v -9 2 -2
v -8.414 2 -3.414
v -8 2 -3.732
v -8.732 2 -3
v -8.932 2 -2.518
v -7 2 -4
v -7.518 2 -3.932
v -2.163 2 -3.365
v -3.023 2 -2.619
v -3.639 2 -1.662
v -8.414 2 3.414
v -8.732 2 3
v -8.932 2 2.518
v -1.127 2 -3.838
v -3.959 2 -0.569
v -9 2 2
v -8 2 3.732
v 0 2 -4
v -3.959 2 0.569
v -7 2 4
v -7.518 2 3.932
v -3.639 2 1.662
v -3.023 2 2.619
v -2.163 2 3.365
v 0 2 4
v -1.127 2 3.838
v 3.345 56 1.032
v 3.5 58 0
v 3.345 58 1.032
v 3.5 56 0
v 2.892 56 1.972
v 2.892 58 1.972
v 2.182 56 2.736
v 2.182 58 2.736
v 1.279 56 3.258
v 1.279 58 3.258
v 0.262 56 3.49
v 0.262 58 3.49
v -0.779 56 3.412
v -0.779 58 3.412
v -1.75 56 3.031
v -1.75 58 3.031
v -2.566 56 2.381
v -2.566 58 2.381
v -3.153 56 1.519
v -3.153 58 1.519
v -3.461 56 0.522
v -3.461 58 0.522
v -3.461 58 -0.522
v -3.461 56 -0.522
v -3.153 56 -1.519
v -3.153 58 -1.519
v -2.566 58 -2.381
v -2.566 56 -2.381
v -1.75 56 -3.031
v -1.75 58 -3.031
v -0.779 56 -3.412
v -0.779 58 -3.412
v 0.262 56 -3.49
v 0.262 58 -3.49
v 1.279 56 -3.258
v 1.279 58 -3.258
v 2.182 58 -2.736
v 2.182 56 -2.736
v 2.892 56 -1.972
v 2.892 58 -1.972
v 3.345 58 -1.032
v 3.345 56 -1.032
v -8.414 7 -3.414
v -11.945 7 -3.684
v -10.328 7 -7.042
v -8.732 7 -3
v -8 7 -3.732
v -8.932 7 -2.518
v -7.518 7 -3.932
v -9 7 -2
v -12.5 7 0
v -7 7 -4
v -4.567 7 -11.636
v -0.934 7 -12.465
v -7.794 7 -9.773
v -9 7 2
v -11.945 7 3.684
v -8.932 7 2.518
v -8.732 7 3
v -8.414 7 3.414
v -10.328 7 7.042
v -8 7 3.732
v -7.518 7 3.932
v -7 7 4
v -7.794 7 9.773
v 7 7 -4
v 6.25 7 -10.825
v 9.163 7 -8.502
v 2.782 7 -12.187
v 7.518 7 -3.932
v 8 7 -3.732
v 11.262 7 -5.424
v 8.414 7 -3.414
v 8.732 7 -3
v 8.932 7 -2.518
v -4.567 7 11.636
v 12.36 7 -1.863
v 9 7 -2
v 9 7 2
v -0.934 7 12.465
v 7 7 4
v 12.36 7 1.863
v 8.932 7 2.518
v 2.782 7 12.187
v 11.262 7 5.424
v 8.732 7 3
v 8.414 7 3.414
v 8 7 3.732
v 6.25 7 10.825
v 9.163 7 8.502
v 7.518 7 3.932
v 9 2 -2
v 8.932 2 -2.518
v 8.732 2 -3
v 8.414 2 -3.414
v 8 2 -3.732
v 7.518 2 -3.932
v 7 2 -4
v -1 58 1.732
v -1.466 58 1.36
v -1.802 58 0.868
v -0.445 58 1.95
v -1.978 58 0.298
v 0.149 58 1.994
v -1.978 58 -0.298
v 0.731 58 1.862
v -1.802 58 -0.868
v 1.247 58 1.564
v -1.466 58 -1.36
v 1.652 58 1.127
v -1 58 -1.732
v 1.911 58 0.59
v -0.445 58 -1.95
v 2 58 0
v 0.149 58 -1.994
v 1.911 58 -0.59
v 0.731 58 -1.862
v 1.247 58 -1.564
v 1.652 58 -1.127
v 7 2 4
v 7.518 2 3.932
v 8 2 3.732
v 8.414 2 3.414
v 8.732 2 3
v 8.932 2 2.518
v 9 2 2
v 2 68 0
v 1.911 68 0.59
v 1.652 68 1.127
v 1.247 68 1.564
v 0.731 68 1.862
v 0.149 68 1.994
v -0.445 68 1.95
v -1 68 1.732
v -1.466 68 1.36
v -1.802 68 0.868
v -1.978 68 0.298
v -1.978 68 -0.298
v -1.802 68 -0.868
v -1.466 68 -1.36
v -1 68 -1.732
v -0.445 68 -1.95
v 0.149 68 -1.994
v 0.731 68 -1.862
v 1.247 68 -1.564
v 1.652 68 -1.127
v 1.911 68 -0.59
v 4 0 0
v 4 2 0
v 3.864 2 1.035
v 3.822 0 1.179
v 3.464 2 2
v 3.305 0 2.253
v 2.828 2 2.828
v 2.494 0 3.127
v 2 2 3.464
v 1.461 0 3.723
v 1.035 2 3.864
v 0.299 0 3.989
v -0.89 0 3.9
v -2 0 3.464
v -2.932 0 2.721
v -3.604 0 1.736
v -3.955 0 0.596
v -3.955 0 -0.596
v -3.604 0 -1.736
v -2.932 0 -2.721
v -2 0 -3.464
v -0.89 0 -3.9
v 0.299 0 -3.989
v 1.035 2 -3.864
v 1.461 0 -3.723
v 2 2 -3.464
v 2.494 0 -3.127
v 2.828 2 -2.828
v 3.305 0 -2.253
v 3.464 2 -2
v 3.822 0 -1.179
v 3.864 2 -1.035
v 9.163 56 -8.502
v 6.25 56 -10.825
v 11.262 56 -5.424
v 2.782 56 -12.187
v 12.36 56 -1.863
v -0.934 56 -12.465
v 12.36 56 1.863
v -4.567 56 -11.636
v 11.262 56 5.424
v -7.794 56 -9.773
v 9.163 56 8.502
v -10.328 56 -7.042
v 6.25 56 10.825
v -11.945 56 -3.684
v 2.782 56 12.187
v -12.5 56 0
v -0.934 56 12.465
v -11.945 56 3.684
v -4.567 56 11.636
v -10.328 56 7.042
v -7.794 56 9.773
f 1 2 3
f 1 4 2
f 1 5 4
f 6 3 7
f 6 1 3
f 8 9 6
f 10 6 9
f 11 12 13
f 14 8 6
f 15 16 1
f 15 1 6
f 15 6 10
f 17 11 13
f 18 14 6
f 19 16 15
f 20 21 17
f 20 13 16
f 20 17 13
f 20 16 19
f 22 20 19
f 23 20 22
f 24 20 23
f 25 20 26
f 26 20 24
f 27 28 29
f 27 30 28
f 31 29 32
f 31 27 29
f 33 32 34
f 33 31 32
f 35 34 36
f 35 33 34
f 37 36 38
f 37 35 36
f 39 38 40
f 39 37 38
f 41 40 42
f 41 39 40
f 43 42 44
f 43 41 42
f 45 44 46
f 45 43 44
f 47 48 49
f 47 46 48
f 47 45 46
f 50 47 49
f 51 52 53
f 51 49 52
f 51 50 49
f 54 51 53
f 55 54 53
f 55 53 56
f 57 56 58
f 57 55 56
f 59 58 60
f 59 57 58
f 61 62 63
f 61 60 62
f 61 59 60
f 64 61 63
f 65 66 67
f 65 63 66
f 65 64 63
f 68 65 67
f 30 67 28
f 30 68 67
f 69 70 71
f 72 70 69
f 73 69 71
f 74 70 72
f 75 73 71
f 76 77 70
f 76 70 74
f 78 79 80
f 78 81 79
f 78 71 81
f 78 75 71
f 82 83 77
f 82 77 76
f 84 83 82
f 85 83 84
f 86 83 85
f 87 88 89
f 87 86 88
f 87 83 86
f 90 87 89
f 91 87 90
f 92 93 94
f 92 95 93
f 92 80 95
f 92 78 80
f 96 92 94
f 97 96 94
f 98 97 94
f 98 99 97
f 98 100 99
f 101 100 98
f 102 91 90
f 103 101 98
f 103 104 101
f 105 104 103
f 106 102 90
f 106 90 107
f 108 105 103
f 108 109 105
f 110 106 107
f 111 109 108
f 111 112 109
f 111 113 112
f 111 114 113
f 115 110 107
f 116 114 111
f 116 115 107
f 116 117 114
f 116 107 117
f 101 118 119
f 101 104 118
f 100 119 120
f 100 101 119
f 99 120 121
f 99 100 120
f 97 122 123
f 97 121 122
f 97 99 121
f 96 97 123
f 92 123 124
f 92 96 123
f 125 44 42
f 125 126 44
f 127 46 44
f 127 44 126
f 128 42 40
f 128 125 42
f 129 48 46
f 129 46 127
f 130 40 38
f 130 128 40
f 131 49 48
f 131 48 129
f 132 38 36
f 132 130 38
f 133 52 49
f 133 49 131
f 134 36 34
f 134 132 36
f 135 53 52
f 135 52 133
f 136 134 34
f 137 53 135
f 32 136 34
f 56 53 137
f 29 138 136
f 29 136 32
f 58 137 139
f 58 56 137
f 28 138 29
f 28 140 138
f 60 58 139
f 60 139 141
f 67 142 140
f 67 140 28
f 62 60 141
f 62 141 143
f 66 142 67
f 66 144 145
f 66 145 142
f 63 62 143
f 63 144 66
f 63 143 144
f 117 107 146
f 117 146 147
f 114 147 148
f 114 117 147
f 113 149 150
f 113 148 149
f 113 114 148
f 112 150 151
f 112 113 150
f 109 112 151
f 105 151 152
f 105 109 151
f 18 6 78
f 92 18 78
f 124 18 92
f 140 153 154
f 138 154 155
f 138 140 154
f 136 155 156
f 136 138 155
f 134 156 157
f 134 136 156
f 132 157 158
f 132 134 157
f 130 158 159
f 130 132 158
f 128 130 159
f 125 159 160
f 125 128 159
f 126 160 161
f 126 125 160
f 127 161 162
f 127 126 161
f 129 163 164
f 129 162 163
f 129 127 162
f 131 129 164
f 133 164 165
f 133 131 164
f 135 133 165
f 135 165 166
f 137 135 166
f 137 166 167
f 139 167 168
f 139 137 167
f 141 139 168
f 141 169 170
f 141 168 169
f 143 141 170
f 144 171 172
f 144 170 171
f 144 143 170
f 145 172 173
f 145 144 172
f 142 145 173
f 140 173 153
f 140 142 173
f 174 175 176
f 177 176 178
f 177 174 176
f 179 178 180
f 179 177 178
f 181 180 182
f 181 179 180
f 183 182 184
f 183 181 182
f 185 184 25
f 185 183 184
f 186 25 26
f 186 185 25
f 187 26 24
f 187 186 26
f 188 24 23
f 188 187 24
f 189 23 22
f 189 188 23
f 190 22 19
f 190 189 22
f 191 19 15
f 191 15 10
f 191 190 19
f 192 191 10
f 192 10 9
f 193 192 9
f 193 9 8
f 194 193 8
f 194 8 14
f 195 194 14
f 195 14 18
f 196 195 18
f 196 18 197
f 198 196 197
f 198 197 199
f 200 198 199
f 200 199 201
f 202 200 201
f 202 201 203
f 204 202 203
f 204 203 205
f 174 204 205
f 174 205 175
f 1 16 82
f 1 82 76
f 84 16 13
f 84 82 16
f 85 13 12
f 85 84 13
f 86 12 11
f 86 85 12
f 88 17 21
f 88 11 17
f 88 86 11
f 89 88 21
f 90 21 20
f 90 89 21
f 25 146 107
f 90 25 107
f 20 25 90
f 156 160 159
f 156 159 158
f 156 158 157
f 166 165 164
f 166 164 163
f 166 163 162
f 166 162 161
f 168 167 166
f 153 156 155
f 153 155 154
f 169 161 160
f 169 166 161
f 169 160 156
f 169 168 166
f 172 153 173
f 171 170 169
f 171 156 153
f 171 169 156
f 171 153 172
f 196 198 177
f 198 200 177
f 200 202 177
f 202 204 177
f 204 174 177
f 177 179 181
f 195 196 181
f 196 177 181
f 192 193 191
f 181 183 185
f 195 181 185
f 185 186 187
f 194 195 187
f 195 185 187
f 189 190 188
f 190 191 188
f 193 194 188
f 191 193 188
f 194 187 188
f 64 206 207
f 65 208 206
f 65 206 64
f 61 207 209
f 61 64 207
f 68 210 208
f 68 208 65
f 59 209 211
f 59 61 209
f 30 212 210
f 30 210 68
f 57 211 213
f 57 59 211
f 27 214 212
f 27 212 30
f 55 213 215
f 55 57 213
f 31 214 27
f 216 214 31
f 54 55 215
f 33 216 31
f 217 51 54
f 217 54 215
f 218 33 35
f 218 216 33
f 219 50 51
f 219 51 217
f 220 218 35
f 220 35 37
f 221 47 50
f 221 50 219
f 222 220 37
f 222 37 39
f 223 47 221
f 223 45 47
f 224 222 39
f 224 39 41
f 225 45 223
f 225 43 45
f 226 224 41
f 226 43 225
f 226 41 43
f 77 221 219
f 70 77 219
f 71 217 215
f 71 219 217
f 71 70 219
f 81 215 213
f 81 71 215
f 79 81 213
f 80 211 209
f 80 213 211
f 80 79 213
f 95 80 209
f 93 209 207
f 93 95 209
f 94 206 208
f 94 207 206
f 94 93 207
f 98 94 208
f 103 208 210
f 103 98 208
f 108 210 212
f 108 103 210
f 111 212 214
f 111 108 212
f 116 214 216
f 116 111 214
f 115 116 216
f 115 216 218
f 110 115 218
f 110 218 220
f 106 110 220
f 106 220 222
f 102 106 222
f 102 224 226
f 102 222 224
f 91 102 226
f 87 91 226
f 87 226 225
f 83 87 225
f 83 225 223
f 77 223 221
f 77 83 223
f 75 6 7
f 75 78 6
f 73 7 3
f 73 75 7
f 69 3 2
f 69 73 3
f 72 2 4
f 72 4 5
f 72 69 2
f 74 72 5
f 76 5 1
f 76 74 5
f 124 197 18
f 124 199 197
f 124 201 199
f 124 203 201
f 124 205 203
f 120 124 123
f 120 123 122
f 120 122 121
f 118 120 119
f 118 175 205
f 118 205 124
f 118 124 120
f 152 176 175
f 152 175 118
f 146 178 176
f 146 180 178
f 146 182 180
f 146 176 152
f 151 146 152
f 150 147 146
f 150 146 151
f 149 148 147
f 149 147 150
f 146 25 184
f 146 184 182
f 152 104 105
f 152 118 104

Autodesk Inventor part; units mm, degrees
ref_plane "YZ Plane" through (0, 0, 0) normal (1, 0, 0) x (0, 1, 0)
ref_plane "XZ Plane" through (0, 0, 0) normal (0, 1, 0) x (-1, 0, 0)
ref_plane "XY Plane" through (0, 0, 0) normal (0, 0, 1) x (1, 0, 0)
sketch "Szkic1" plane through (0, 0, 0) normal (0, 1, 0) x (-1, 0, 0)
  circle A0 centre (0, 0) radius 12.5
  dimension "d0" = 25
extrude "Wyciągnięcie proste1" add sketch "Szkic1" along normal blind 56
sketch "Szkic2" plane through (0, 56, 0) normal (0, 1, 0) x (1, 0, 0)
  circle A0 centre (0, 0) radius 2
  dimension "d3" = 4
extrude "Wyciągnięcie proste2" add sketch "Szkic2" along normal blind 12
sketch "Szkic3" plane through (0, 56, 0) normal (0, 1, 0) x (1, 0, 0)
  circle A0 centre (0, 0) radius 3.5
  dimension "d6" = 7
extrude "Wyciągnięcie proste3" add sketch "Szkic3" along normal blind 2
sketch "Szkic4" plane through (0, 0, 0) normal (0, -1, 0) x (1, 0, 0)
  circle A0 centre (0, 0) radius 2 projected
  circle A1 centre (0, 0) radius 4
  circle A2 centre (0, 0) radius 12.5
  dimension "d9" = 8
extrude "Wyciągnięcie proste4" cut sketch "Szkic4" against normal blind 2 contours A2
sketch "Szkic5" plane through (0, 2, 0) normal (0, -1, 0) x (1, 0, 0)
  line L0 (-9, -4) -> (9, -4)
  line L1 (9, -4) -> (9, 4)
  line L2 (9, 4) -> (-9, 4)
  line L3 (-9, 4) -> (-9, -4)
  circle A0 centre (0, 0) radius 4 projected
  circle A1 centre (0, 0) radius 12.5
  dimension "d12" = 9
  dimension "d13" = 18
extrude "Wyciągnięcie proste5" cut sketch "Szkic5" against normal blind 5
fillet "Zaokrąglenie1" radius 2 4 edges at (-9, 4.5, 4) (-9, 4.5, -4) (9, 4.5, 4) (9, 4.5, -4)
properties part number "Silnik_SKUA"
